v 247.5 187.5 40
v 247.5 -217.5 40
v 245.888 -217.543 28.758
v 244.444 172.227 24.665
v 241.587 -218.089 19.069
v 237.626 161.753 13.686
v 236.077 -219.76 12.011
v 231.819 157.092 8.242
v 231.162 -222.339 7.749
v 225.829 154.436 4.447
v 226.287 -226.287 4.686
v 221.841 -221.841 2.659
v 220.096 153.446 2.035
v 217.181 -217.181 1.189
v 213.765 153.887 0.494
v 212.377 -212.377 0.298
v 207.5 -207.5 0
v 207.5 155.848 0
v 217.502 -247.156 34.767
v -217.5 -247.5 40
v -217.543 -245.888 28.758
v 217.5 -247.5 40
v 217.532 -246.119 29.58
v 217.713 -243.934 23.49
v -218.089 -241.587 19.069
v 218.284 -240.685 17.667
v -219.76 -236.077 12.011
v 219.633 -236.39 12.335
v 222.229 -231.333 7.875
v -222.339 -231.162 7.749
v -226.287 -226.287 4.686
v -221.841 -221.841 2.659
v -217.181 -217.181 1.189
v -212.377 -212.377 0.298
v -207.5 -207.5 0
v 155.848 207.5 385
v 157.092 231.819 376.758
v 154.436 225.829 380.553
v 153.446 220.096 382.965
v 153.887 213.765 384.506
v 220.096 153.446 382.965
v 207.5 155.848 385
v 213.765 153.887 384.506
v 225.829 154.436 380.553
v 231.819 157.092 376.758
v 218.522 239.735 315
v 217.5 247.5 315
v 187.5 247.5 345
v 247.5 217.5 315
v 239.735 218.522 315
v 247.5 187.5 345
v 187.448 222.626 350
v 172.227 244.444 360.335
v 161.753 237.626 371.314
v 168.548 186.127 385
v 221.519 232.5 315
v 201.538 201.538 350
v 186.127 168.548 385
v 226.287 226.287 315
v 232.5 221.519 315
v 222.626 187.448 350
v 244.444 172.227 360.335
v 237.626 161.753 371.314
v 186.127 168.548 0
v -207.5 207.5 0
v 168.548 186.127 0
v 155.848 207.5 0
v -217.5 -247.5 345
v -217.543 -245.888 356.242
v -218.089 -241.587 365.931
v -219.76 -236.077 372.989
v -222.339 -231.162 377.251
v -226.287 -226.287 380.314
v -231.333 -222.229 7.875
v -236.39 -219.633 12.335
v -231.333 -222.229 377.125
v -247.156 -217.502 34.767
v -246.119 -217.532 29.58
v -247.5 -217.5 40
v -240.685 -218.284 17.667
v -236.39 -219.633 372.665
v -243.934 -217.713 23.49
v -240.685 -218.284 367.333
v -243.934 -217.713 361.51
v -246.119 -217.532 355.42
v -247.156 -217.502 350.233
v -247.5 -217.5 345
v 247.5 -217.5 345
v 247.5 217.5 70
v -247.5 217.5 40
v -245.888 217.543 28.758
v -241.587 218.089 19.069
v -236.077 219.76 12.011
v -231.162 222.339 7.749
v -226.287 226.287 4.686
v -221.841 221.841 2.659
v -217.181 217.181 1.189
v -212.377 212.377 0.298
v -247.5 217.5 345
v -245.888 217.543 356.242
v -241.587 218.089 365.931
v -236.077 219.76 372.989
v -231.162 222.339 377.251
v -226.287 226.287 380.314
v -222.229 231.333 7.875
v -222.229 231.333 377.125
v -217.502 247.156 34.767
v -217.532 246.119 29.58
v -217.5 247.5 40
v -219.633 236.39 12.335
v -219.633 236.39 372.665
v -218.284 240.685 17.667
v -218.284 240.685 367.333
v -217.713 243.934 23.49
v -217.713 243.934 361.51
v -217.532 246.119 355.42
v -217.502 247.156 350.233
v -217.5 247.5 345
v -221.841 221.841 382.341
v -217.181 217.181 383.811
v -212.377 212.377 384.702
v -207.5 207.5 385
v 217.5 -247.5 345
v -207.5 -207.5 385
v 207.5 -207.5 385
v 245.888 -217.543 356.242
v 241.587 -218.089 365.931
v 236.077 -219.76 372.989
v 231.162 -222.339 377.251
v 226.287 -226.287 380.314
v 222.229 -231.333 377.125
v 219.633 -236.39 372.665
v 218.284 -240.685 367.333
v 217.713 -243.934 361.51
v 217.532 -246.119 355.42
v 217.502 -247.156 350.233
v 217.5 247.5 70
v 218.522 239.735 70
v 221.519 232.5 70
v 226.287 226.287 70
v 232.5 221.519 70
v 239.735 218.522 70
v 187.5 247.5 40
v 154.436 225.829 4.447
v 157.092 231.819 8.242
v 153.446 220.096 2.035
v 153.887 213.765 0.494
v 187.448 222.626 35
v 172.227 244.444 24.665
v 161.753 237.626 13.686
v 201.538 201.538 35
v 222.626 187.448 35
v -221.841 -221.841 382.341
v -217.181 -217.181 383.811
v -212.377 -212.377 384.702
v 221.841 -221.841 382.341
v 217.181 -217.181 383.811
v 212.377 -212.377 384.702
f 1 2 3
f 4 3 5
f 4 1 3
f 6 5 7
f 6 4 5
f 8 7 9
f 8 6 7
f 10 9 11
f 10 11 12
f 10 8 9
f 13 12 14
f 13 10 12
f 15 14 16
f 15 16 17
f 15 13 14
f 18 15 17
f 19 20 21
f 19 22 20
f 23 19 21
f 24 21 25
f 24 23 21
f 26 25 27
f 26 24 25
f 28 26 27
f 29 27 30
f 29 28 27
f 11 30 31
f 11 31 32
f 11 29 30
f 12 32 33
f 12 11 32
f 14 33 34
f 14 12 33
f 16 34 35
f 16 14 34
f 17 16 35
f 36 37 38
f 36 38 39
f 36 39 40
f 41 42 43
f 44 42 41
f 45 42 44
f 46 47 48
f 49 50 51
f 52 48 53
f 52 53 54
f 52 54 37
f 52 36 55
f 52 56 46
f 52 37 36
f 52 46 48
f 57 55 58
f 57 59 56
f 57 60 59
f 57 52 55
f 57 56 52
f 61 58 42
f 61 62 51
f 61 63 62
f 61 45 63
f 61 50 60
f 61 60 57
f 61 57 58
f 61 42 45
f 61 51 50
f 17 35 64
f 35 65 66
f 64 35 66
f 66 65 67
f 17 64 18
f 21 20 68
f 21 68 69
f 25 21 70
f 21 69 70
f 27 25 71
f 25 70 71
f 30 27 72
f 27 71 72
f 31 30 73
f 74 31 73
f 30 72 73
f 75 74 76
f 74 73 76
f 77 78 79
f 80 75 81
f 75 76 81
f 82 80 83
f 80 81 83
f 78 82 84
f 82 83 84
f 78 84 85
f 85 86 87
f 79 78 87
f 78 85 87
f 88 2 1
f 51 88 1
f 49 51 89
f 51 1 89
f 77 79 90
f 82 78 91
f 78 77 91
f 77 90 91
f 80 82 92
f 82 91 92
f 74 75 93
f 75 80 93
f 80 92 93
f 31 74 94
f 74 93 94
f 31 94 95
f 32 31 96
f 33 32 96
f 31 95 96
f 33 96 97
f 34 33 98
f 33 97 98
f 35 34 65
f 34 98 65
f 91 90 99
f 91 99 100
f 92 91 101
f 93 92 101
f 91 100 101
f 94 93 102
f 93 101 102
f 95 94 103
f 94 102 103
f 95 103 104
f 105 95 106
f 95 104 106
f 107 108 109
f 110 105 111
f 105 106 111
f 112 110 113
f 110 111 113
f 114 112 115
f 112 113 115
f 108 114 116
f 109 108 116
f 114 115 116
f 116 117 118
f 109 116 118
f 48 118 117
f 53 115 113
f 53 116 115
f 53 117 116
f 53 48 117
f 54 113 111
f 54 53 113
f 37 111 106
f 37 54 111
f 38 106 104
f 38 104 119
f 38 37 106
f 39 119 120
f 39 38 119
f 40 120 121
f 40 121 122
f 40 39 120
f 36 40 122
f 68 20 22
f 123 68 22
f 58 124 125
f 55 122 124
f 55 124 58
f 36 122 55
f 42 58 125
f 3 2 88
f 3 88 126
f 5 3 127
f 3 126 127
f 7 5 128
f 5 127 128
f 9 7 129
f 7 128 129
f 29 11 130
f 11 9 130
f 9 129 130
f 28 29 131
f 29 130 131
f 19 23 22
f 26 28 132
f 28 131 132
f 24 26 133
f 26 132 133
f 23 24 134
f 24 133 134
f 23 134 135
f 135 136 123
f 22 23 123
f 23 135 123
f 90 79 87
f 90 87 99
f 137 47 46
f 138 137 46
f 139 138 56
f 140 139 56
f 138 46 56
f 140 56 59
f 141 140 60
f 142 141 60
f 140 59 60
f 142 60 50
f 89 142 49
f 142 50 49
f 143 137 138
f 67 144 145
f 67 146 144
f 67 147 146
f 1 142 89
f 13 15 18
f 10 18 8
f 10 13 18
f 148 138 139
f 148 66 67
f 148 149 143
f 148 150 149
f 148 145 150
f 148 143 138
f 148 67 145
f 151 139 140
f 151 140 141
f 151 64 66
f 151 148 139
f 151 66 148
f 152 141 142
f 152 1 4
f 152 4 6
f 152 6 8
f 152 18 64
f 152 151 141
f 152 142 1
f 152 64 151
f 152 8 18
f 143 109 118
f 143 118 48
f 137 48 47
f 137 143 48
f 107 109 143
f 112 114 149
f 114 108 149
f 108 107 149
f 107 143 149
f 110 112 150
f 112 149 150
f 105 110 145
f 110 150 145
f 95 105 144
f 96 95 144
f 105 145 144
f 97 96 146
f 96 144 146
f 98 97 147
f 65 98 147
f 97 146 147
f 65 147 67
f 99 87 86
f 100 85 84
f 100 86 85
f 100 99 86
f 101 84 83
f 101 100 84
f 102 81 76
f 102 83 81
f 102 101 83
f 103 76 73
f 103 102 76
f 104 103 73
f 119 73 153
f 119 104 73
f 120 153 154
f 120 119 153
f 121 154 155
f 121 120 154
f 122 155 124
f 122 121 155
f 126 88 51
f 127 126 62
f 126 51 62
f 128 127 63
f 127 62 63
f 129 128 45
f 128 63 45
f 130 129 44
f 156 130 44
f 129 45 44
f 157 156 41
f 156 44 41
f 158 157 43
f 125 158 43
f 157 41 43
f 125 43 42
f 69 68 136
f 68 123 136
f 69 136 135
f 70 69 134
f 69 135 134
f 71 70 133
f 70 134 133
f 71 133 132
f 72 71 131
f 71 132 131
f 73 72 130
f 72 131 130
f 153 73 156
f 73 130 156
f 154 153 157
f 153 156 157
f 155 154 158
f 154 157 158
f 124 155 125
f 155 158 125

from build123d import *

# Parameters (mm, degrees)
F0_W     = 495
F0_H     = 495
F1_DEPTH = 385
F2_R     = 40
F5_R     = 30
F6_DEPTH = 385.0010001


with BuildPart() as f1:
    # F0 (on Top) → F1 (new body)
    with BuildSketch(Plane.XY):
        Rectangle(F0_W, F0_H)
    extrude(amount=F1_DEPTH)

    # F2
    f2_edges = [f1.edges().sort_by_distance(p)[0] for p in [
        (-247.5, 0, 385),
        (0, -247.5, 385),
        (247.5, 0, 385),
        (0, 247.5, 385),
        (247.5, 0, 0),
        (0, -247.5, 0),
        (-247.5, 0, 0),
        (0, 247.5, 0),
    ]]
    fillet(f2_edges, radius=F2_R)

    # F3 (on face) → F4 (revolve, cut)
    with BuildSketch(Plane.YZ.offset(247.5)):
        Polygon((147.5, 385), (247.5, 285), (247.5, 385), align=None)
        Polygon((247.5, 52.9406964779), (247.5, 100), (147.5, 0), (247.5, 0), align=None)
    revolve(axis=Axis((247.5, 247.5, 295.5484241247), (0, 0, 1)), mode=Mode.SUBTRACT)

    # F5 (on face) + F1_face2 (on face) → F6 (cut, through all)
    with BuildSketch(Plane.XY.offset(385)):
        with Locations((247.5, 247.5)):
            Circle(F5_R)
        with Locations((-247.5, 247.5)):
            Circle(F5_R)
        with Locations((-247.5, -247.5)):
            Circle(F5_R)
        with Locations((247.5, -247.5)):
            Circle(F5_R)
    with BuildSketch(Plane(origin=(-1.8452724724, -1.8452724724, 0), x_dir=(1, 0, 0), z_dir=(0, 0, -1))):
        with BuildLine():
            Line((209.3452724724, 205.6547275276), (-205.6547275276, 205.6547275276))
            Line((-205.6547275276, 205.6547275276), (-205.6547275276, -209.3452724724))
            Line((-205.6547275276, -209.3452724724), (157.6937585733, -209.3452724724))
            ThreePointArc((157.6937585733, -209.3452724724), (178.6345943538, -178.6345943538), (209.3452724724, -157.6937585733))
            Line((209.3452724724, -157.6937585733), (209.3452724724, 205.6547275276))
        make_face()
    extrude(amount=-F6_DEPTH, dir=(0, 0, 1), mode=Mode.SUBTRACT)


solid = f1.part
